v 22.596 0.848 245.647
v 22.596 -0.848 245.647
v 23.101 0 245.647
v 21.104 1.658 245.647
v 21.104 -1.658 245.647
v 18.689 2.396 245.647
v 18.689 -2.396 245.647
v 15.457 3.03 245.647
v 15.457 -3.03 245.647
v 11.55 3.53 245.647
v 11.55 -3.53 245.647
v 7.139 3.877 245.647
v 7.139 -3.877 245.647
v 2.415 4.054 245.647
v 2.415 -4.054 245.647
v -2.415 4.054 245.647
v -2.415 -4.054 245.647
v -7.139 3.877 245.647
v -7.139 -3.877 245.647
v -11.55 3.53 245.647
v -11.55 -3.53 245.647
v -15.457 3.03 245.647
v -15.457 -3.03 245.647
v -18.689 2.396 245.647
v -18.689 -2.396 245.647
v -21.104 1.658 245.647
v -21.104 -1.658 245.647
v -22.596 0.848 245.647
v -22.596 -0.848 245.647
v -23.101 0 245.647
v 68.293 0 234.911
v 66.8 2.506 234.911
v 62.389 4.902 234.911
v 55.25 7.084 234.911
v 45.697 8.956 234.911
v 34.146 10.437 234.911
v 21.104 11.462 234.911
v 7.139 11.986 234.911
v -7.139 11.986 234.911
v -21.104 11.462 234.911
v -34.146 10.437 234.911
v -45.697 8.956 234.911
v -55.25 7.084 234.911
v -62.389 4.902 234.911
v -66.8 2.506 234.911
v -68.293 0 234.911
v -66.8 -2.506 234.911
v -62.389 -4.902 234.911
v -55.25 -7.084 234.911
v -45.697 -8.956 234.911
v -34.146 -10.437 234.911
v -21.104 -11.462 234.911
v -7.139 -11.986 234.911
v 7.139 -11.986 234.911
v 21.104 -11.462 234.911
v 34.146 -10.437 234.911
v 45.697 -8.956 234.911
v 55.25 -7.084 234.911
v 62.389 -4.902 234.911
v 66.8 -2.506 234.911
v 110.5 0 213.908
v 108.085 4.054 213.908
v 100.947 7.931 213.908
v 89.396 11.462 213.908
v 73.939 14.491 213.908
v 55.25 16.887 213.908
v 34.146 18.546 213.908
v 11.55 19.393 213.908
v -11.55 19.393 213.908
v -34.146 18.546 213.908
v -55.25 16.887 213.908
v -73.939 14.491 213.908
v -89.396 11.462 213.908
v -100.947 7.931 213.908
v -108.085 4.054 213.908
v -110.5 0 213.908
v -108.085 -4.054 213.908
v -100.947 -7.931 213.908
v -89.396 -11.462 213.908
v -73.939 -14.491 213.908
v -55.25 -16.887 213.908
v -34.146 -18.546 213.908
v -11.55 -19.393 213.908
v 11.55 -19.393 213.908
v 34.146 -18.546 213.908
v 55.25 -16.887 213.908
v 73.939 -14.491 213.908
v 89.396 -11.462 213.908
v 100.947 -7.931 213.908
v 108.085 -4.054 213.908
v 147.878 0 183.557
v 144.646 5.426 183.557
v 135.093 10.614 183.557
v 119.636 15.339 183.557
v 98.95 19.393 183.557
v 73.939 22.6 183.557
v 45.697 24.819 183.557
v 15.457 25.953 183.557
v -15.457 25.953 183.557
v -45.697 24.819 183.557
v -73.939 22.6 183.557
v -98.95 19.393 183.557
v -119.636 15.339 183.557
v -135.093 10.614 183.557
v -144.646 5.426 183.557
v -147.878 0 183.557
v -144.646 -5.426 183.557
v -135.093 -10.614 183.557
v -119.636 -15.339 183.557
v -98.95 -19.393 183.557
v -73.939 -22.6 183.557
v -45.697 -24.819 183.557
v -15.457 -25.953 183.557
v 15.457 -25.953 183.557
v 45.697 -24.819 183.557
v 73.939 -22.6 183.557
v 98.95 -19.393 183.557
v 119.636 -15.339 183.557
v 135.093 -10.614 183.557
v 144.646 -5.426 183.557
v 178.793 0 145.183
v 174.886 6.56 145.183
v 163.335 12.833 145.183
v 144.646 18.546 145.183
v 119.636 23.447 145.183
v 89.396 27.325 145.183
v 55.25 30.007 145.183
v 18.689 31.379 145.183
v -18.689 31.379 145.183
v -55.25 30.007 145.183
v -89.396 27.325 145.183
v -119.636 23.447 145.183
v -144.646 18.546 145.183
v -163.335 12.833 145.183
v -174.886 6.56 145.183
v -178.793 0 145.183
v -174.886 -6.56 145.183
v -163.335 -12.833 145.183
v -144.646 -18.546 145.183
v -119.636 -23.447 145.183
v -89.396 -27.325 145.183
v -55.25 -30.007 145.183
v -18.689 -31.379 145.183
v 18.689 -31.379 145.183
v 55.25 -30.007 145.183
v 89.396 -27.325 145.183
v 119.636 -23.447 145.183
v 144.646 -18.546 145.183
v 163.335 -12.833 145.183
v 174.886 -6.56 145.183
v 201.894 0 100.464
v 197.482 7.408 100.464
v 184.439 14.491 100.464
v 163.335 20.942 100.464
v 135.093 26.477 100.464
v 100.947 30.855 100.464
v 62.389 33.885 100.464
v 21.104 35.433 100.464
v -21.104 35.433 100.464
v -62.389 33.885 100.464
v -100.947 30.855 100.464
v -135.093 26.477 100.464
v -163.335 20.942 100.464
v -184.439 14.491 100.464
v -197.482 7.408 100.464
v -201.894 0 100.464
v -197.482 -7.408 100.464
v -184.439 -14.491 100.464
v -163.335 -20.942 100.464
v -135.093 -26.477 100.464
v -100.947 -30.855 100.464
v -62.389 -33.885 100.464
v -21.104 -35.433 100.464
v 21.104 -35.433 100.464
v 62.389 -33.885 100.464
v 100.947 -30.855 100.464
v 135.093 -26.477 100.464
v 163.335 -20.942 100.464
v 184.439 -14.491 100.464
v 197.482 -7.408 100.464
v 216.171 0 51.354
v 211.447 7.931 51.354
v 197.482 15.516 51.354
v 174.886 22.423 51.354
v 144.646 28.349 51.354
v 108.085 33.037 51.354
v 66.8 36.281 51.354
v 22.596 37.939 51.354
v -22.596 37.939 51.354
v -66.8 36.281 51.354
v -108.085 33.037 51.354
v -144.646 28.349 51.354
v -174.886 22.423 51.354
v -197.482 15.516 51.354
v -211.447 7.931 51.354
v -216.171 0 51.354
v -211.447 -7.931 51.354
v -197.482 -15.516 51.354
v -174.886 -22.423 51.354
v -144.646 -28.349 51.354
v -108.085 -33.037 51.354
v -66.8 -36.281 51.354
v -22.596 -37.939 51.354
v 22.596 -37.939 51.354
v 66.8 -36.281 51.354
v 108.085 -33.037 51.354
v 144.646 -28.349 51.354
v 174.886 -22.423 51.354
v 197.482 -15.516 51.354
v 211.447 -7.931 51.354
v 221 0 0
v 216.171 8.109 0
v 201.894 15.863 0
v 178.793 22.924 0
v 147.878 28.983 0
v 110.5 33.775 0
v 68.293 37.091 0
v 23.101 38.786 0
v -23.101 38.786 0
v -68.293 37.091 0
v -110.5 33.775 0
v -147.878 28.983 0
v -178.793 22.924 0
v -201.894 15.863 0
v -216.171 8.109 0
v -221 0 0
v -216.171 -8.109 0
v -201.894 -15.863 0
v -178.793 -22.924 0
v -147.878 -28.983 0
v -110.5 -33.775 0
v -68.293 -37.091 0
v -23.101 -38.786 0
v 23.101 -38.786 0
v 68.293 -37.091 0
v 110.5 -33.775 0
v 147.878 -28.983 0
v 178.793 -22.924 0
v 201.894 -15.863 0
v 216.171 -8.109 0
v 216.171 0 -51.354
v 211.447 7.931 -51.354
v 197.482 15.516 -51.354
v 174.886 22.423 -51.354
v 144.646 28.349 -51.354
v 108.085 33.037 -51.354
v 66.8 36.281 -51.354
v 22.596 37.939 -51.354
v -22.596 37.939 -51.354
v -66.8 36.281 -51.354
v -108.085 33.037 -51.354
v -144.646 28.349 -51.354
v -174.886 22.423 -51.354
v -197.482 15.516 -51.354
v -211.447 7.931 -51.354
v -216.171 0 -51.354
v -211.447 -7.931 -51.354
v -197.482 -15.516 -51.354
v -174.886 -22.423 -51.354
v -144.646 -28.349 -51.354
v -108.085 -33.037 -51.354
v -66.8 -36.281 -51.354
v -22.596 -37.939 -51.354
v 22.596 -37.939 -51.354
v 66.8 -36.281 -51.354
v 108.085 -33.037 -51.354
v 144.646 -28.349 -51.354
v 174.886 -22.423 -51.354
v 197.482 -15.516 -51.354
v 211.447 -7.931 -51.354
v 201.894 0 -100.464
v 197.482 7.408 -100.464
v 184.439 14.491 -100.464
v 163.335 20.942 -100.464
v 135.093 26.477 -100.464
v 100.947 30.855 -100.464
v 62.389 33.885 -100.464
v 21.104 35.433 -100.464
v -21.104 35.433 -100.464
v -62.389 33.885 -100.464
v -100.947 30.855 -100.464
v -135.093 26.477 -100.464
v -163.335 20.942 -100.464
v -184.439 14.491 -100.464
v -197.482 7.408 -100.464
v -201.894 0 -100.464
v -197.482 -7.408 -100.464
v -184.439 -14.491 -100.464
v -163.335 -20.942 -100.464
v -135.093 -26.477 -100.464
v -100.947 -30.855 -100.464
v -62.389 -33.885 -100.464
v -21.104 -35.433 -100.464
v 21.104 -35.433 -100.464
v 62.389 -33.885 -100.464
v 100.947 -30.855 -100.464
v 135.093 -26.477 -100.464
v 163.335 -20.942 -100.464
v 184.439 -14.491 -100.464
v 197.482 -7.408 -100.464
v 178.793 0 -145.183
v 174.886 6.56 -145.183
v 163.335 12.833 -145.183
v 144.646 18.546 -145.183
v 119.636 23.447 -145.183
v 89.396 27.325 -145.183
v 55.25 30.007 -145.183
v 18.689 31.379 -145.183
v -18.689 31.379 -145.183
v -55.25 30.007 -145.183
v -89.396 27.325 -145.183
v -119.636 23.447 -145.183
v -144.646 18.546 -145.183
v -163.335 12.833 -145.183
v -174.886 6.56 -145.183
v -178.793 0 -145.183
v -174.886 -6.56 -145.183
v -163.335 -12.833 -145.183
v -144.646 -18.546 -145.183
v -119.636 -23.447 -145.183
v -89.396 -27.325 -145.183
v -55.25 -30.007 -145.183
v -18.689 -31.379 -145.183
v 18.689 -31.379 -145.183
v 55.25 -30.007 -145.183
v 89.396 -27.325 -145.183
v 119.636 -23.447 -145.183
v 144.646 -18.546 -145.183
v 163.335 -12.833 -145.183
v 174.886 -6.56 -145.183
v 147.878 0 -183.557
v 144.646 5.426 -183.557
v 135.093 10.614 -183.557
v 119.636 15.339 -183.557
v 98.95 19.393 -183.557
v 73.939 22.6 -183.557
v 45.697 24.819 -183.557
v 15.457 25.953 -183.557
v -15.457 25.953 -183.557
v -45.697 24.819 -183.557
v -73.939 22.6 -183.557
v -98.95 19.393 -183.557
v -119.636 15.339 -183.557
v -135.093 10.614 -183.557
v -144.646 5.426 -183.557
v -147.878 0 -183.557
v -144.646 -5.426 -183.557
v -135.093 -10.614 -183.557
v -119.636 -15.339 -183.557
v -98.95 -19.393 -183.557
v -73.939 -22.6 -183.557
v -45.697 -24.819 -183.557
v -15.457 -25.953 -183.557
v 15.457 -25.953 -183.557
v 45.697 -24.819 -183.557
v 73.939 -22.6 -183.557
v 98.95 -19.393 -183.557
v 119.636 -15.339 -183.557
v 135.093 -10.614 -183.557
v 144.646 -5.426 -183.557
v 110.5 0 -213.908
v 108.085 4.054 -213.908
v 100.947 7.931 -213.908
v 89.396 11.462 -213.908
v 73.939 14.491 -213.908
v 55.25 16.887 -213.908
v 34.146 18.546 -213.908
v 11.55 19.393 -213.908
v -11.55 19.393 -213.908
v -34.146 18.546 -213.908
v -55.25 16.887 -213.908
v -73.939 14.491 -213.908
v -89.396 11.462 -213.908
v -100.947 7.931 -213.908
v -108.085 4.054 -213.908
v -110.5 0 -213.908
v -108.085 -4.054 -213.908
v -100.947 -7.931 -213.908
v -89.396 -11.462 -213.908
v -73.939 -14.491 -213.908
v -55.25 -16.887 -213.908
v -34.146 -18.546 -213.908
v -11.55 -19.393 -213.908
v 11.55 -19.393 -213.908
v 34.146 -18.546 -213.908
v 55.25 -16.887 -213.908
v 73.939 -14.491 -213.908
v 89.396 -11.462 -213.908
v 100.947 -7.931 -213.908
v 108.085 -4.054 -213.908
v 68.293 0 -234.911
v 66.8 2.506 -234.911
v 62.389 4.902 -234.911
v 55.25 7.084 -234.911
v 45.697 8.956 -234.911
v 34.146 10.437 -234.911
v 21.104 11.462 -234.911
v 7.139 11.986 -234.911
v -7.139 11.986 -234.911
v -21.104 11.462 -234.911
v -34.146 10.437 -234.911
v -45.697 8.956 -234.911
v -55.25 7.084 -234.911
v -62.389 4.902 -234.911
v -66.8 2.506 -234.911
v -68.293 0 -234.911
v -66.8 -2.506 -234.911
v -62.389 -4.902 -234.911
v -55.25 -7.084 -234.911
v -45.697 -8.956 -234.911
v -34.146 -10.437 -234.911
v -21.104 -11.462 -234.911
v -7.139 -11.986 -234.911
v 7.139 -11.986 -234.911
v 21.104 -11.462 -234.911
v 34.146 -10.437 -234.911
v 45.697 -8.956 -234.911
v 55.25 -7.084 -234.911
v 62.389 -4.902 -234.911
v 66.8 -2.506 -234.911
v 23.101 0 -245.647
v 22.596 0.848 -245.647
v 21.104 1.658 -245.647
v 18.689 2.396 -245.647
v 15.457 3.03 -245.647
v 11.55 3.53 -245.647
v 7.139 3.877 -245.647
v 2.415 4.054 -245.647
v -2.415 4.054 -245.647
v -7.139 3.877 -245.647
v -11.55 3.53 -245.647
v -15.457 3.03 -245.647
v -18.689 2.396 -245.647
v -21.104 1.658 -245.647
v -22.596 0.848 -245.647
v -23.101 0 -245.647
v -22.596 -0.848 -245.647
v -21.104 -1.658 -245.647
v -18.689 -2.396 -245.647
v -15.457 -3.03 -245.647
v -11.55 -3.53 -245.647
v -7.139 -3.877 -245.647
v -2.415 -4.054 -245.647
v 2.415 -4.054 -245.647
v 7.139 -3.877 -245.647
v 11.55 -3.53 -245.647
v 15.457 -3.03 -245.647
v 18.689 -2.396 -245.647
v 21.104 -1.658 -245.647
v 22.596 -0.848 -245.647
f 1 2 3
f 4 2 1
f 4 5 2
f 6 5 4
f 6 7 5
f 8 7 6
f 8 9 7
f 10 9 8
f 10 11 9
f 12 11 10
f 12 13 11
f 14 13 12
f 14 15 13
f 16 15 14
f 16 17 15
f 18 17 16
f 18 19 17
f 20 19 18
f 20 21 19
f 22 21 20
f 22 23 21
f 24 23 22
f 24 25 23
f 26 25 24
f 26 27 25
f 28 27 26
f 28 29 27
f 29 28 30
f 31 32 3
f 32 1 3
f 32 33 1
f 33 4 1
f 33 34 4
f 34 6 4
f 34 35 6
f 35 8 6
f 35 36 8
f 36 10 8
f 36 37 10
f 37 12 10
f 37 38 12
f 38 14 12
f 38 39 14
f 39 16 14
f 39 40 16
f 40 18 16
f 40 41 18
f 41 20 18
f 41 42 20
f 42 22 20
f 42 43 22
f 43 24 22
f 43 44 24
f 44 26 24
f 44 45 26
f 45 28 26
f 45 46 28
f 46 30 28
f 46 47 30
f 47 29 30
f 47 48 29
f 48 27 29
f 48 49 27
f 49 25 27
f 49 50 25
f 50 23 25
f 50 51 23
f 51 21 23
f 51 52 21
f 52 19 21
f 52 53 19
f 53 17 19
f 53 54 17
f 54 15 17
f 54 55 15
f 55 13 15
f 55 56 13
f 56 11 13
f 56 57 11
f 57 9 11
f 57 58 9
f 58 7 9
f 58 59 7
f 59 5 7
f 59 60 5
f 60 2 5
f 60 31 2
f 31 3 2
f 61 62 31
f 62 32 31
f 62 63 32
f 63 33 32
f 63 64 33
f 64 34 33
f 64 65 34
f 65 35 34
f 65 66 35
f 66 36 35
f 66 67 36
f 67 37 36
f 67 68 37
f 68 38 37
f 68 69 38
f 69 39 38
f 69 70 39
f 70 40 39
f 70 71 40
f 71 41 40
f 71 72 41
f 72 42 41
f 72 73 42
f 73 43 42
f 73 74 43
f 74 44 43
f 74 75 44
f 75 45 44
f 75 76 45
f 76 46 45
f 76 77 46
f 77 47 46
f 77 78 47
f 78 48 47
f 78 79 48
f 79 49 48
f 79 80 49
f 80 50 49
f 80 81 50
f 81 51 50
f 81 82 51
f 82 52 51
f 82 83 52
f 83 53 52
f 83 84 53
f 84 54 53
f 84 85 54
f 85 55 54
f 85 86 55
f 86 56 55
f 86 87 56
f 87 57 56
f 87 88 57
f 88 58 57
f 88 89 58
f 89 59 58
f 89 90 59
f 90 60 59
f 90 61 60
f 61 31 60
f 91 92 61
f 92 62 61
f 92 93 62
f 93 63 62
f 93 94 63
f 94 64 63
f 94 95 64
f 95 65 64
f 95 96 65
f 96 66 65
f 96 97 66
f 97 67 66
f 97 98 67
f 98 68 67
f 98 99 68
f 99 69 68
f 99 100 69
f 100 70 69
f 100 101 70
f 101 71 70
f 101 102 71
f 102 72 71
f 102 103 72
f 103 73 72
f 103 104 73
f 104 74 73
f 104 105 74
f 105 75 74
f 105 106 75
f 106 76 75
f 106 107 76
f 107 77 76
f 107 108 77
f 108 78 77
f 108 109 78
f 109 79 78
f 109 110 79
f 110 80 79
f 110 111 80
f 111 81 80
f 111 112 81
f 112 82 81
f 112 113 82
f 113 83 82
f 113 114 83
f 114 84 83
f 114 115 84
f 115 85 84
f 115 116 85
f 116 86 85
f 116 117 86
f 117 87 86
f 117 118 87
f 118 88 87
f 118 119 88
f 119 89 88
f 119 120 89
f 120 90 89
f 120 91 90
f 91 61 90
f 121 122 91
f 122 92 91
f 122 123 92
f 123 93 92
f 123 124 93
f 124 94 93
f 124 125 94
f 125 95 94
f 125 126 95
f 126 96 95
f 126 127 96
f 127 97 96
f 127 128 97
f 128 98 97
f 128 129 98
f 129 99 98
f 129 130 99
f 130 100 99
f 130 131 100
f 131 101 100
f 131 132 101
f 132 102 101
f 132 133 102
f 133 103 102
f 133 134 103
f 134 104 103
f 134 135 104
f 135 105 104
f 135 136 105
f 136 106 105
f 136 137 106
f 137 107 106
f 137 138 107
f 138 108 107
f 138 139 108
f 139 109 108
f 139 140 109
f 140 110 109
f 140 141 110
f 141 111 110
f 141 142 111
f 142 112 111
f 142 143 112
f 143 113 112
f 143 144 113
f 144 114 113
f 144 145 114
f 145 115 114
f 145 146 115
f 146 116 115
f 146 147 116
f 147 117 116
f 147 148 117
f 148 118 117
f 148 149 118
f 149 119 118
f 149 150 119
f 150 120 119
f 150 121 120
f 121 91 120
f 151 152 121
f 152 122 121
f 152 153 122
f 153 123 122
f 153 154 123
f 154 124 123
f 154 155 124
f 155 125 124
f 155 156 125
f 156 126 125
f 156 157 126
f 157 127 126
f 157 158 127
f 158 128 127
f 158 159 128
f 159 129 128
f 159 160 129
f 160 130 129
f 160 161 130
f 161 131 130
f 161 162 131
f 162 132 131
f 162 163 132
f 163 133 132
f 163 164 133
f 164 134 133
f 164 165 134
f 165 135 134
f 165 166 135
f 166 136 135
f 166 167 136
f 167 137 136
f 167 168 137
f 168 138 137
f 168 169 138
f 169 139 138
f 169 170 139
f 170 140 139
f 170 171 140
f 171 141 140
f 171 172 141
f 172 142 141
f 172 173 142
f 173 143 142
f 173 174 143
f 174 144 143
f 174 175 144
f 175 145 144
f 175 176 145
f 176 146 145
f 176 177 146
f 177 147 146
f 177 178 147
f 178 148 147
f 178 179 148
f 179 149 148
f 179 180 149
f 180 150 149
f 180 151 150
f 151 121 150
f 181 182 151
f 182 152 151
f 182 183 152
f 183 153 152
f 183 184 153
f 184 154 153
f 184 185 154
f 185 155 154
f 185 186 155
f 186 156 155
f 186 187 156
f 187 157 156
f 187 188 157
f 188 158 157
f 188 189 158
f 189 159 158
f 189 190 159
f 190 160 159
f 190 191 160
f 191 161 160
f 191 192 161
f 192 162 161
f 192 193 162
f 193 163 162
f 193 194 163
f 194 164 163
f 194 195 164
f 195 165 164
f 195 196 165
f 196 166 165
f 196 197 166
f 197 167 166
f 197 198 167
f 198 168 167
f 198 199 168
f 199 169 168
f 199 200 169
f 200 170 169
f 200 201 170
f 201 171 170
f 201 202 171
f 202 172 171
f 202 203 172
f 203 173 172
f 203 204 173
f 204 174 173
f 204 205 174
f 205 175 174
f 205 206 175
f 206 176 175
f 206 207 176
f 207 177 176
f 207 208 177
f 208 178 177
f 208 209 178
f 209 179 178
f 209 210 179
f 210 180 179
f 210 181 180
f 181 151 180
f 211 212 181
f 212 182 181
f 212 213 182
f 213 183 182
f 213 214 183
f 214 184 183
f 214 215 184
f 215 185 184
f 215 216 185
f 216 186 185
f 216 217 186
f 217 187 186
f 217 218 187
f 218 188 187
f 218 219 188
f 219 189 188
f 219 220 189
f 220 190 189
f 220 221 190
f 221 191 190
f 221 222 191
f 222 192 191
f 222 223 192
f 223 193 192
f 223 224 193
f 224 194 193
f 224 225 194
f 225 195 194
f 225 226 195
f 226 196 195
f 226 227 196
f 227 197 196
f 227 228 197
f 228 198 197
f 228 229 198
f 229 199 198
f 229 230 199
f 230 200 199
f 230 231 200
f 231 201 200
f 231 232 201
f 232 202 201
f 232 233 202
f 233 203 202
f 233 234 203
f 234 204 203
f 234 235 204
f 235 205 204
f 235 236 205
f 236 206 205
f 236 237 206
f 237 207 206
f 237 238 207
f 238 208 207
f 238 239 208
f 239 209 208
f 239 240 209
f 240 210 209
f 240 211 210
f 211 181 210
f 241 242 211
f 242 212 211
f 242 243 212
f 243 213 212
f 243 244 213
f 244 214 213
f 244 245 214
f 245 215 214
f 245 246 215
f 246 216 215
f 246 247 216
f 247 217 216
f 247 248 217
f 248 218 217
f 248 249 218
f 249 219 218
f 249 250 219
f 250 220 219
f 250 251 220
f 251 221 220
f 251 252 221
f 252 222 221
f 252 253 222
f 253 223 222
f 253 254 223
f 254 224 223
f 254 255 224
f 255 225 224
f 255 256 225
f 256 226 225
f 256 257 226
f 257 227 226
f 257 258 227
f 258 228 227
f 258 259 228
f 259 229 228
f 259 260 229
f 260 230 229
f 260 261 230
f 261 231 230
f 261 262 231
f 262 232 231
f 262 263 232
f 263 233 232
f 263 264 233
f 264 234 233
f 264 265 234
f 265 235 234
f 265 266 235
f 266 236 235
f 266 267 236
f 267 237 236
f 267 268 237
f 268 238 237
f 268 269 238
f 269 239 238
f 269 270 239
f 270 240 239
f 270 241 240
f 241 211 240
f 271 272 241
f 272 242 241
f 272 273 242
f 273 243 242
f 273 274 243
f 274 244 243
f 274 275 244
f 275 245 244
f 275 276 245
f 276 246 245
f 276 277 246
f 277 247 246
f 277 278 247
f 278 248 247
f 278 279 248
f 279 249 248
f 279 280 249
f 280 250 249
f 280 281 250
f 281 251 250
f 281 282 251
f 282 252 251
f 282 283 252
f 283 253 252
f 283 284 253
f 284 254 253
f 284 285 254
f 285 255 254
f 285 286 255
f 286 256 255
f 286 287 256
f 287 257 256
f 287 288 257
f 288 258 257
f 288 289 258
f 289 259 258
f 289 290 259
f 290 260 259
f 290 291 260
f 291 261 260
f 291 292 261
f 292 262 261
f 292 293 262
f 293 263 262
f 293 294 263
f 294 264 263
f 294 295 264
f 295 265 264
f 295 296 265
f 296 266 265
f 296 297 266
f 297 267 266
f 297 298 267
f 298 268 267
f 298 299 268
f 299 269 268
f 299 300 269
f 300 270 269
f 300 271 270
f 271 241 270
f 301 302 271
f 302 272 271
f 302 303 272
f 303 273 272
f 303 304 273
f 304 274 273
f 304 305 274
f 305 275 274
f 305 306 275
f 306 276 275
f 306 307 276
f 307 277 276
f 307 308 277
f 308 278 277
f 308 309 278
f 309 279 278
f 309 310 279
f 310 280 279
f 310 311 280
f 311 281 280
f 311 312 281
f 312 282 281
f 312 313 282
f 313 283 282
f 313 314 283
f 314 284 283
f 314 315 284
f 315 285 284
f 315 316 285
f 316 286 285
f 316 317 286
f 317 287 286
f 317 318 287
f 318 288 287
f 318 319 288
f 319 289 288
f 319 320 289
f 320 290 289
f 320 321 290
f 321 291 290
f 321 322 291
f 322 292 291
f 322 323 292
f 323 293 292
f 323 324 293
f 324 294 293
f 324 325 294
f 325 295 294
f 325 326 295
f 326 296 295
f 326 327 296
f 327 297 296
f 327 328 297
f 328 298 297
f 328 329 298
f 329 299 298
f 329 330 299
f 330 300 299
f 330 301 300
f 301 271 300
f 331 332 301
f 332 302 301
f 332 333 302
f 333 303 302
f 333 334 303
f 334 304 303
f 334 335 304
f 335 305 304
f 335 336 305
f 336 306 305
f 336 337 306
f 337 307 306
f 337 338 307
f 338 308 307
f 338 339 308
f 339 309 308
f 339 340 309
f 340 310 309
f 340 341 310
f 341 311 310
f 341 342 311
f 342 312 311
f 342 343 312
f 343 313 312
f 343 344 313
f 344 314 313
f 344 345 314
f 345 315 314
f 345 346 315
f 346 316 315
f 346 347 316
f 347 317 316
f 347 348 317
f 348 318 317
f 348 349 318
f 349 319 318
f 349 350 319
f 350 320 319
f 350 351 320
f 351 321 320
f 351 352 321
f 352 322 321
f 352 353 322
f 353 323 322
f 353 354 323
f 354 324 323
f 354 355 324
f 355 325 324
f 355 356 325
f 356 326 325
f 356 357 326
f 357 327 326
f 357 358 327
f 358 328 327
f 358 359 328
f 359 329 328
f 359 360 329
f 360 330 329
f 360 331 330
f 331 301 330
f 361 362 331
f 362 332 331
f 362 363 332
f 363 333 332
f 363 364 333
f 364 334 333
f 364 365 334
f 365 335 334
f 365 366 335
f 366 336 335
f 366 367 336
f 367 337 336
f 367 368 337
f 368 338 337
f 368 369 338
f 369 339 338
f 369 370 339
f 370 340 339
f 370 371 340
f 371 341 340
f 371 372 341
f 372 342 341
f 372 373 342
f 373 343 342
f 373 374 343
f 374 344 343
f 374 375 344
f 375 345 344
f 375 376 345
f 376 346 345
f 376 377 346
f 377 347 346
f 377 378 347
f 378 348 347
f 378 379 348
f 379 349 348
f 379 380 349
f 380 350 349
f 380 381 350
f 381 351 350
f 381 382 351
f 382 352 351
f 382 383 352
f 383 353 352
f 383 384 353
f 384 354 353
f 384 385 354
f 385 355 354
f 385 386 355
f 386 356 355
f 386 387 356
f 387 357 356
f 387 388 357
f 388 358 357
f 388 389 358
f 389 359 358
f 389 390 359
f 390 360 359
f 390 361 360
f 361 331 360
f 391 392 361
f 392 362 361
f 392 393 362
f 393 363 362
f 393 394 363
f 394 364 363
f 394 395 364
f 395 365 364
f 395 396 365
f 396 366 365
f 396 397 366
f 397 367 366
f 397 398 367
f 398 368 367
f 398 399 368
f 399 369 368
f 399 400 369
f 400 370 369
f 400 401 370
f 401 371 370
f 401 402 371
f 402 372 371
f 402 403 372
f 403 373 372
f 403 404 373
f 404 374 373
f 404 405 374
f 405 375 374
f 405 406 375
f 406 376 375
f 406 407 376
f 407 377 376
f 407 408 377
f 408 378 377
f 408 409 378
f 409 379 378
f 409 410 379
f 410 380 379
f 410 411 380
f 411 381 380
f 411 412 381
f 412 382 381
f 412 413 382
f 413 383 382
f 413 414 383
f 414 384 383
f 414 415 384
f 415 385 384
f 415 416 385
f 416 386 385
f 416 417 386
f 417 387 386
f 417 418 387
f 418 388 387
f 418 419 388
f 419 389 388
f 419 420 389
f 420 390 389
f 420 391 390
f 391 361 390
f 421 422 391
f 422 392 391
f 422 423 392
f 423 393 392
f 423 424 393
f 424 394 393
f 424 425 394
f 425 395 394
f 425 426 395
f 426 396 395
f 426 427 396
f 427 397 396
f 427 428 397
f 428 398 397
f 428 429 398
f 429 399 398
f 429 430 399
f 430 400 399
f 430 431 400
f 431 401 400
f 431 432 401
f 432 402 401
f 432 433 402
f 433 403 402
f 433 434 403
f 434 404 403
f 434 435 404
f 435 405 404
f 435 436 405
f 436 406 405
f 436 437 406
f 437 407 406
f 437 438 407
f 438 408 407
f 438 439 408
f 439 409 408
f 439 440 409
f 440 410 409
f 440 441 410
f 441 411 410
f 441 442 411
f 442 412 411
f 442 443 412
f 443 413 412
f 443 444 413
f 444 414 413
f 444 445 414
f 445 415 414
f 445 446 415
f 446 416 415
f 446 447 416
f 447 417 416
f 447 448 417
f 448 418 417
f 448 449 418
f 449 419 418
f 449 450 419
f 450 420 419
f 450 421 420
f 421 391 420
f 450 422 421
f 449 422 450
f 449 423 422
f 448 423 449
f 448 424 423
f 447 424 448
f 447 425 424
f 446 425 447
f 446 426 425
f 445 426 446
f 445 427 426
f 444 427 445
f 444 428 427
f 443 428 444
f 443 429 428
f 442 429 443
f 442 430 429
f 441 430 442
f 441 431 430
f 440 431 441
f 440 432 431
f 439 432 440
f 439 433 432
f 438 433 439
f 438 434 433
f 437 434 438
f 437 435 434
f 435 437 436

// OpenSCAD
// Generated by SolidPython 1.0.1 on 2020-07-29 00:46:52


scale(v = [17, 3, 19]) {
	sphere(r = 13);
}
/***********************************************
*********      SolidPython code:      **********
************************************************
 
# import packages: SolidPython
from solid import *
from solid.utils import *
from itertools import chain, combinations, permutations


class Resize:

    def __init__(self, scad_file):
        self.scad_file = scad_file
        #self.scad_file = import_scad(scad_file)
        # cone/cylinder param:
        self.r1 = 0
        self.r2 = 0
        self.h = 0
        # rectangular prism param:
        self.w = 0
        self.l = 0
        # ellipse param:
        self.r = 0

    # import OpenScad code (file name corresponds to shape)


    # classify shape + parameters
    def assign(self, param1, param2, param3):
        if self.scad_file == 'cone.scad':
            self.r1 = param1
            self.r2 = param2
            self.h = param3
        elif self.scad_file == 'cylinder.scad':
            self.r1 = param1
            self.r2 = param2
            self.h = param3
        elif self.scad_file == 'rectangularPrism.scad':
            self.h = param1
            self.l = param2
            self.w = param3
        else:
            self.r = param1
            self.h = param2

    # resize parameters
    def iterate(self):
        x = range(3, 20, 2)
        i = 1
        if self.scad_file == 'cone.scad':
            tempList = list(permutations(x, 2))
            for temp in tempList:
                param1 = temp[0]
                param2 = temp[1]
                filepath = 'produced_scad_files/' + 'cone' + str(param1) + '_' + str(param2) + '_' + '.scad'
                scad_render_to_file(cylinder(h=param1, r1=param2, r2=0), filepath)

        elif self.scad_file == 'cylinder.scad':
            tempList = list(permutations(x, 3))
            for temp in tempList:
                param1 = temp[0]
                param2 = temp[1]
                filepath = 'produced_scad_files/' + 'cylinder' + str(param1) + '_' + str(param2) + '_' + '.scad'
                scad_render_to_file(cylinder(h=param1, r1=param2, r2=param2), filepath)

        elif self.scad_file == 'rectangularPrism.scad':
            tempList = list(permutations(x, 3))
            for temp in tempList:
                param1 = temp[0]
                param2 = temp[1]
                param3 = temp[2]
                filepath = 'produced_scad_files/' + 'rectangularPrism' + str(param1) + '_' + str(param2) + '_' + str(
                    param3) + '.scad'
                scad_render_to_file(cube(size=(param1, param2, param3)), filepath)

        elif self.scad_file == 'ellipse.scad':
            tempList = list(permutations(x, 4))
            for temp in tempList:
                param1 = temp[0]
                param2 = temp[1]
                param3 = temp[2]
                param4 = temp[3]
                filepath = 'produced_scad_files/' + 'ellipse' + str(param1) + '_' + str(param2) + '_' + str(param3) + '_' + str(param4) + '.scad'
                scad_render_to_file(scale([param1, param2, param3])(sphere(r=param4)), filepath)

    def render_to_scadfile(self):
        scad_render_to_file(scad, 'example.scad') 
 
************************************************/
